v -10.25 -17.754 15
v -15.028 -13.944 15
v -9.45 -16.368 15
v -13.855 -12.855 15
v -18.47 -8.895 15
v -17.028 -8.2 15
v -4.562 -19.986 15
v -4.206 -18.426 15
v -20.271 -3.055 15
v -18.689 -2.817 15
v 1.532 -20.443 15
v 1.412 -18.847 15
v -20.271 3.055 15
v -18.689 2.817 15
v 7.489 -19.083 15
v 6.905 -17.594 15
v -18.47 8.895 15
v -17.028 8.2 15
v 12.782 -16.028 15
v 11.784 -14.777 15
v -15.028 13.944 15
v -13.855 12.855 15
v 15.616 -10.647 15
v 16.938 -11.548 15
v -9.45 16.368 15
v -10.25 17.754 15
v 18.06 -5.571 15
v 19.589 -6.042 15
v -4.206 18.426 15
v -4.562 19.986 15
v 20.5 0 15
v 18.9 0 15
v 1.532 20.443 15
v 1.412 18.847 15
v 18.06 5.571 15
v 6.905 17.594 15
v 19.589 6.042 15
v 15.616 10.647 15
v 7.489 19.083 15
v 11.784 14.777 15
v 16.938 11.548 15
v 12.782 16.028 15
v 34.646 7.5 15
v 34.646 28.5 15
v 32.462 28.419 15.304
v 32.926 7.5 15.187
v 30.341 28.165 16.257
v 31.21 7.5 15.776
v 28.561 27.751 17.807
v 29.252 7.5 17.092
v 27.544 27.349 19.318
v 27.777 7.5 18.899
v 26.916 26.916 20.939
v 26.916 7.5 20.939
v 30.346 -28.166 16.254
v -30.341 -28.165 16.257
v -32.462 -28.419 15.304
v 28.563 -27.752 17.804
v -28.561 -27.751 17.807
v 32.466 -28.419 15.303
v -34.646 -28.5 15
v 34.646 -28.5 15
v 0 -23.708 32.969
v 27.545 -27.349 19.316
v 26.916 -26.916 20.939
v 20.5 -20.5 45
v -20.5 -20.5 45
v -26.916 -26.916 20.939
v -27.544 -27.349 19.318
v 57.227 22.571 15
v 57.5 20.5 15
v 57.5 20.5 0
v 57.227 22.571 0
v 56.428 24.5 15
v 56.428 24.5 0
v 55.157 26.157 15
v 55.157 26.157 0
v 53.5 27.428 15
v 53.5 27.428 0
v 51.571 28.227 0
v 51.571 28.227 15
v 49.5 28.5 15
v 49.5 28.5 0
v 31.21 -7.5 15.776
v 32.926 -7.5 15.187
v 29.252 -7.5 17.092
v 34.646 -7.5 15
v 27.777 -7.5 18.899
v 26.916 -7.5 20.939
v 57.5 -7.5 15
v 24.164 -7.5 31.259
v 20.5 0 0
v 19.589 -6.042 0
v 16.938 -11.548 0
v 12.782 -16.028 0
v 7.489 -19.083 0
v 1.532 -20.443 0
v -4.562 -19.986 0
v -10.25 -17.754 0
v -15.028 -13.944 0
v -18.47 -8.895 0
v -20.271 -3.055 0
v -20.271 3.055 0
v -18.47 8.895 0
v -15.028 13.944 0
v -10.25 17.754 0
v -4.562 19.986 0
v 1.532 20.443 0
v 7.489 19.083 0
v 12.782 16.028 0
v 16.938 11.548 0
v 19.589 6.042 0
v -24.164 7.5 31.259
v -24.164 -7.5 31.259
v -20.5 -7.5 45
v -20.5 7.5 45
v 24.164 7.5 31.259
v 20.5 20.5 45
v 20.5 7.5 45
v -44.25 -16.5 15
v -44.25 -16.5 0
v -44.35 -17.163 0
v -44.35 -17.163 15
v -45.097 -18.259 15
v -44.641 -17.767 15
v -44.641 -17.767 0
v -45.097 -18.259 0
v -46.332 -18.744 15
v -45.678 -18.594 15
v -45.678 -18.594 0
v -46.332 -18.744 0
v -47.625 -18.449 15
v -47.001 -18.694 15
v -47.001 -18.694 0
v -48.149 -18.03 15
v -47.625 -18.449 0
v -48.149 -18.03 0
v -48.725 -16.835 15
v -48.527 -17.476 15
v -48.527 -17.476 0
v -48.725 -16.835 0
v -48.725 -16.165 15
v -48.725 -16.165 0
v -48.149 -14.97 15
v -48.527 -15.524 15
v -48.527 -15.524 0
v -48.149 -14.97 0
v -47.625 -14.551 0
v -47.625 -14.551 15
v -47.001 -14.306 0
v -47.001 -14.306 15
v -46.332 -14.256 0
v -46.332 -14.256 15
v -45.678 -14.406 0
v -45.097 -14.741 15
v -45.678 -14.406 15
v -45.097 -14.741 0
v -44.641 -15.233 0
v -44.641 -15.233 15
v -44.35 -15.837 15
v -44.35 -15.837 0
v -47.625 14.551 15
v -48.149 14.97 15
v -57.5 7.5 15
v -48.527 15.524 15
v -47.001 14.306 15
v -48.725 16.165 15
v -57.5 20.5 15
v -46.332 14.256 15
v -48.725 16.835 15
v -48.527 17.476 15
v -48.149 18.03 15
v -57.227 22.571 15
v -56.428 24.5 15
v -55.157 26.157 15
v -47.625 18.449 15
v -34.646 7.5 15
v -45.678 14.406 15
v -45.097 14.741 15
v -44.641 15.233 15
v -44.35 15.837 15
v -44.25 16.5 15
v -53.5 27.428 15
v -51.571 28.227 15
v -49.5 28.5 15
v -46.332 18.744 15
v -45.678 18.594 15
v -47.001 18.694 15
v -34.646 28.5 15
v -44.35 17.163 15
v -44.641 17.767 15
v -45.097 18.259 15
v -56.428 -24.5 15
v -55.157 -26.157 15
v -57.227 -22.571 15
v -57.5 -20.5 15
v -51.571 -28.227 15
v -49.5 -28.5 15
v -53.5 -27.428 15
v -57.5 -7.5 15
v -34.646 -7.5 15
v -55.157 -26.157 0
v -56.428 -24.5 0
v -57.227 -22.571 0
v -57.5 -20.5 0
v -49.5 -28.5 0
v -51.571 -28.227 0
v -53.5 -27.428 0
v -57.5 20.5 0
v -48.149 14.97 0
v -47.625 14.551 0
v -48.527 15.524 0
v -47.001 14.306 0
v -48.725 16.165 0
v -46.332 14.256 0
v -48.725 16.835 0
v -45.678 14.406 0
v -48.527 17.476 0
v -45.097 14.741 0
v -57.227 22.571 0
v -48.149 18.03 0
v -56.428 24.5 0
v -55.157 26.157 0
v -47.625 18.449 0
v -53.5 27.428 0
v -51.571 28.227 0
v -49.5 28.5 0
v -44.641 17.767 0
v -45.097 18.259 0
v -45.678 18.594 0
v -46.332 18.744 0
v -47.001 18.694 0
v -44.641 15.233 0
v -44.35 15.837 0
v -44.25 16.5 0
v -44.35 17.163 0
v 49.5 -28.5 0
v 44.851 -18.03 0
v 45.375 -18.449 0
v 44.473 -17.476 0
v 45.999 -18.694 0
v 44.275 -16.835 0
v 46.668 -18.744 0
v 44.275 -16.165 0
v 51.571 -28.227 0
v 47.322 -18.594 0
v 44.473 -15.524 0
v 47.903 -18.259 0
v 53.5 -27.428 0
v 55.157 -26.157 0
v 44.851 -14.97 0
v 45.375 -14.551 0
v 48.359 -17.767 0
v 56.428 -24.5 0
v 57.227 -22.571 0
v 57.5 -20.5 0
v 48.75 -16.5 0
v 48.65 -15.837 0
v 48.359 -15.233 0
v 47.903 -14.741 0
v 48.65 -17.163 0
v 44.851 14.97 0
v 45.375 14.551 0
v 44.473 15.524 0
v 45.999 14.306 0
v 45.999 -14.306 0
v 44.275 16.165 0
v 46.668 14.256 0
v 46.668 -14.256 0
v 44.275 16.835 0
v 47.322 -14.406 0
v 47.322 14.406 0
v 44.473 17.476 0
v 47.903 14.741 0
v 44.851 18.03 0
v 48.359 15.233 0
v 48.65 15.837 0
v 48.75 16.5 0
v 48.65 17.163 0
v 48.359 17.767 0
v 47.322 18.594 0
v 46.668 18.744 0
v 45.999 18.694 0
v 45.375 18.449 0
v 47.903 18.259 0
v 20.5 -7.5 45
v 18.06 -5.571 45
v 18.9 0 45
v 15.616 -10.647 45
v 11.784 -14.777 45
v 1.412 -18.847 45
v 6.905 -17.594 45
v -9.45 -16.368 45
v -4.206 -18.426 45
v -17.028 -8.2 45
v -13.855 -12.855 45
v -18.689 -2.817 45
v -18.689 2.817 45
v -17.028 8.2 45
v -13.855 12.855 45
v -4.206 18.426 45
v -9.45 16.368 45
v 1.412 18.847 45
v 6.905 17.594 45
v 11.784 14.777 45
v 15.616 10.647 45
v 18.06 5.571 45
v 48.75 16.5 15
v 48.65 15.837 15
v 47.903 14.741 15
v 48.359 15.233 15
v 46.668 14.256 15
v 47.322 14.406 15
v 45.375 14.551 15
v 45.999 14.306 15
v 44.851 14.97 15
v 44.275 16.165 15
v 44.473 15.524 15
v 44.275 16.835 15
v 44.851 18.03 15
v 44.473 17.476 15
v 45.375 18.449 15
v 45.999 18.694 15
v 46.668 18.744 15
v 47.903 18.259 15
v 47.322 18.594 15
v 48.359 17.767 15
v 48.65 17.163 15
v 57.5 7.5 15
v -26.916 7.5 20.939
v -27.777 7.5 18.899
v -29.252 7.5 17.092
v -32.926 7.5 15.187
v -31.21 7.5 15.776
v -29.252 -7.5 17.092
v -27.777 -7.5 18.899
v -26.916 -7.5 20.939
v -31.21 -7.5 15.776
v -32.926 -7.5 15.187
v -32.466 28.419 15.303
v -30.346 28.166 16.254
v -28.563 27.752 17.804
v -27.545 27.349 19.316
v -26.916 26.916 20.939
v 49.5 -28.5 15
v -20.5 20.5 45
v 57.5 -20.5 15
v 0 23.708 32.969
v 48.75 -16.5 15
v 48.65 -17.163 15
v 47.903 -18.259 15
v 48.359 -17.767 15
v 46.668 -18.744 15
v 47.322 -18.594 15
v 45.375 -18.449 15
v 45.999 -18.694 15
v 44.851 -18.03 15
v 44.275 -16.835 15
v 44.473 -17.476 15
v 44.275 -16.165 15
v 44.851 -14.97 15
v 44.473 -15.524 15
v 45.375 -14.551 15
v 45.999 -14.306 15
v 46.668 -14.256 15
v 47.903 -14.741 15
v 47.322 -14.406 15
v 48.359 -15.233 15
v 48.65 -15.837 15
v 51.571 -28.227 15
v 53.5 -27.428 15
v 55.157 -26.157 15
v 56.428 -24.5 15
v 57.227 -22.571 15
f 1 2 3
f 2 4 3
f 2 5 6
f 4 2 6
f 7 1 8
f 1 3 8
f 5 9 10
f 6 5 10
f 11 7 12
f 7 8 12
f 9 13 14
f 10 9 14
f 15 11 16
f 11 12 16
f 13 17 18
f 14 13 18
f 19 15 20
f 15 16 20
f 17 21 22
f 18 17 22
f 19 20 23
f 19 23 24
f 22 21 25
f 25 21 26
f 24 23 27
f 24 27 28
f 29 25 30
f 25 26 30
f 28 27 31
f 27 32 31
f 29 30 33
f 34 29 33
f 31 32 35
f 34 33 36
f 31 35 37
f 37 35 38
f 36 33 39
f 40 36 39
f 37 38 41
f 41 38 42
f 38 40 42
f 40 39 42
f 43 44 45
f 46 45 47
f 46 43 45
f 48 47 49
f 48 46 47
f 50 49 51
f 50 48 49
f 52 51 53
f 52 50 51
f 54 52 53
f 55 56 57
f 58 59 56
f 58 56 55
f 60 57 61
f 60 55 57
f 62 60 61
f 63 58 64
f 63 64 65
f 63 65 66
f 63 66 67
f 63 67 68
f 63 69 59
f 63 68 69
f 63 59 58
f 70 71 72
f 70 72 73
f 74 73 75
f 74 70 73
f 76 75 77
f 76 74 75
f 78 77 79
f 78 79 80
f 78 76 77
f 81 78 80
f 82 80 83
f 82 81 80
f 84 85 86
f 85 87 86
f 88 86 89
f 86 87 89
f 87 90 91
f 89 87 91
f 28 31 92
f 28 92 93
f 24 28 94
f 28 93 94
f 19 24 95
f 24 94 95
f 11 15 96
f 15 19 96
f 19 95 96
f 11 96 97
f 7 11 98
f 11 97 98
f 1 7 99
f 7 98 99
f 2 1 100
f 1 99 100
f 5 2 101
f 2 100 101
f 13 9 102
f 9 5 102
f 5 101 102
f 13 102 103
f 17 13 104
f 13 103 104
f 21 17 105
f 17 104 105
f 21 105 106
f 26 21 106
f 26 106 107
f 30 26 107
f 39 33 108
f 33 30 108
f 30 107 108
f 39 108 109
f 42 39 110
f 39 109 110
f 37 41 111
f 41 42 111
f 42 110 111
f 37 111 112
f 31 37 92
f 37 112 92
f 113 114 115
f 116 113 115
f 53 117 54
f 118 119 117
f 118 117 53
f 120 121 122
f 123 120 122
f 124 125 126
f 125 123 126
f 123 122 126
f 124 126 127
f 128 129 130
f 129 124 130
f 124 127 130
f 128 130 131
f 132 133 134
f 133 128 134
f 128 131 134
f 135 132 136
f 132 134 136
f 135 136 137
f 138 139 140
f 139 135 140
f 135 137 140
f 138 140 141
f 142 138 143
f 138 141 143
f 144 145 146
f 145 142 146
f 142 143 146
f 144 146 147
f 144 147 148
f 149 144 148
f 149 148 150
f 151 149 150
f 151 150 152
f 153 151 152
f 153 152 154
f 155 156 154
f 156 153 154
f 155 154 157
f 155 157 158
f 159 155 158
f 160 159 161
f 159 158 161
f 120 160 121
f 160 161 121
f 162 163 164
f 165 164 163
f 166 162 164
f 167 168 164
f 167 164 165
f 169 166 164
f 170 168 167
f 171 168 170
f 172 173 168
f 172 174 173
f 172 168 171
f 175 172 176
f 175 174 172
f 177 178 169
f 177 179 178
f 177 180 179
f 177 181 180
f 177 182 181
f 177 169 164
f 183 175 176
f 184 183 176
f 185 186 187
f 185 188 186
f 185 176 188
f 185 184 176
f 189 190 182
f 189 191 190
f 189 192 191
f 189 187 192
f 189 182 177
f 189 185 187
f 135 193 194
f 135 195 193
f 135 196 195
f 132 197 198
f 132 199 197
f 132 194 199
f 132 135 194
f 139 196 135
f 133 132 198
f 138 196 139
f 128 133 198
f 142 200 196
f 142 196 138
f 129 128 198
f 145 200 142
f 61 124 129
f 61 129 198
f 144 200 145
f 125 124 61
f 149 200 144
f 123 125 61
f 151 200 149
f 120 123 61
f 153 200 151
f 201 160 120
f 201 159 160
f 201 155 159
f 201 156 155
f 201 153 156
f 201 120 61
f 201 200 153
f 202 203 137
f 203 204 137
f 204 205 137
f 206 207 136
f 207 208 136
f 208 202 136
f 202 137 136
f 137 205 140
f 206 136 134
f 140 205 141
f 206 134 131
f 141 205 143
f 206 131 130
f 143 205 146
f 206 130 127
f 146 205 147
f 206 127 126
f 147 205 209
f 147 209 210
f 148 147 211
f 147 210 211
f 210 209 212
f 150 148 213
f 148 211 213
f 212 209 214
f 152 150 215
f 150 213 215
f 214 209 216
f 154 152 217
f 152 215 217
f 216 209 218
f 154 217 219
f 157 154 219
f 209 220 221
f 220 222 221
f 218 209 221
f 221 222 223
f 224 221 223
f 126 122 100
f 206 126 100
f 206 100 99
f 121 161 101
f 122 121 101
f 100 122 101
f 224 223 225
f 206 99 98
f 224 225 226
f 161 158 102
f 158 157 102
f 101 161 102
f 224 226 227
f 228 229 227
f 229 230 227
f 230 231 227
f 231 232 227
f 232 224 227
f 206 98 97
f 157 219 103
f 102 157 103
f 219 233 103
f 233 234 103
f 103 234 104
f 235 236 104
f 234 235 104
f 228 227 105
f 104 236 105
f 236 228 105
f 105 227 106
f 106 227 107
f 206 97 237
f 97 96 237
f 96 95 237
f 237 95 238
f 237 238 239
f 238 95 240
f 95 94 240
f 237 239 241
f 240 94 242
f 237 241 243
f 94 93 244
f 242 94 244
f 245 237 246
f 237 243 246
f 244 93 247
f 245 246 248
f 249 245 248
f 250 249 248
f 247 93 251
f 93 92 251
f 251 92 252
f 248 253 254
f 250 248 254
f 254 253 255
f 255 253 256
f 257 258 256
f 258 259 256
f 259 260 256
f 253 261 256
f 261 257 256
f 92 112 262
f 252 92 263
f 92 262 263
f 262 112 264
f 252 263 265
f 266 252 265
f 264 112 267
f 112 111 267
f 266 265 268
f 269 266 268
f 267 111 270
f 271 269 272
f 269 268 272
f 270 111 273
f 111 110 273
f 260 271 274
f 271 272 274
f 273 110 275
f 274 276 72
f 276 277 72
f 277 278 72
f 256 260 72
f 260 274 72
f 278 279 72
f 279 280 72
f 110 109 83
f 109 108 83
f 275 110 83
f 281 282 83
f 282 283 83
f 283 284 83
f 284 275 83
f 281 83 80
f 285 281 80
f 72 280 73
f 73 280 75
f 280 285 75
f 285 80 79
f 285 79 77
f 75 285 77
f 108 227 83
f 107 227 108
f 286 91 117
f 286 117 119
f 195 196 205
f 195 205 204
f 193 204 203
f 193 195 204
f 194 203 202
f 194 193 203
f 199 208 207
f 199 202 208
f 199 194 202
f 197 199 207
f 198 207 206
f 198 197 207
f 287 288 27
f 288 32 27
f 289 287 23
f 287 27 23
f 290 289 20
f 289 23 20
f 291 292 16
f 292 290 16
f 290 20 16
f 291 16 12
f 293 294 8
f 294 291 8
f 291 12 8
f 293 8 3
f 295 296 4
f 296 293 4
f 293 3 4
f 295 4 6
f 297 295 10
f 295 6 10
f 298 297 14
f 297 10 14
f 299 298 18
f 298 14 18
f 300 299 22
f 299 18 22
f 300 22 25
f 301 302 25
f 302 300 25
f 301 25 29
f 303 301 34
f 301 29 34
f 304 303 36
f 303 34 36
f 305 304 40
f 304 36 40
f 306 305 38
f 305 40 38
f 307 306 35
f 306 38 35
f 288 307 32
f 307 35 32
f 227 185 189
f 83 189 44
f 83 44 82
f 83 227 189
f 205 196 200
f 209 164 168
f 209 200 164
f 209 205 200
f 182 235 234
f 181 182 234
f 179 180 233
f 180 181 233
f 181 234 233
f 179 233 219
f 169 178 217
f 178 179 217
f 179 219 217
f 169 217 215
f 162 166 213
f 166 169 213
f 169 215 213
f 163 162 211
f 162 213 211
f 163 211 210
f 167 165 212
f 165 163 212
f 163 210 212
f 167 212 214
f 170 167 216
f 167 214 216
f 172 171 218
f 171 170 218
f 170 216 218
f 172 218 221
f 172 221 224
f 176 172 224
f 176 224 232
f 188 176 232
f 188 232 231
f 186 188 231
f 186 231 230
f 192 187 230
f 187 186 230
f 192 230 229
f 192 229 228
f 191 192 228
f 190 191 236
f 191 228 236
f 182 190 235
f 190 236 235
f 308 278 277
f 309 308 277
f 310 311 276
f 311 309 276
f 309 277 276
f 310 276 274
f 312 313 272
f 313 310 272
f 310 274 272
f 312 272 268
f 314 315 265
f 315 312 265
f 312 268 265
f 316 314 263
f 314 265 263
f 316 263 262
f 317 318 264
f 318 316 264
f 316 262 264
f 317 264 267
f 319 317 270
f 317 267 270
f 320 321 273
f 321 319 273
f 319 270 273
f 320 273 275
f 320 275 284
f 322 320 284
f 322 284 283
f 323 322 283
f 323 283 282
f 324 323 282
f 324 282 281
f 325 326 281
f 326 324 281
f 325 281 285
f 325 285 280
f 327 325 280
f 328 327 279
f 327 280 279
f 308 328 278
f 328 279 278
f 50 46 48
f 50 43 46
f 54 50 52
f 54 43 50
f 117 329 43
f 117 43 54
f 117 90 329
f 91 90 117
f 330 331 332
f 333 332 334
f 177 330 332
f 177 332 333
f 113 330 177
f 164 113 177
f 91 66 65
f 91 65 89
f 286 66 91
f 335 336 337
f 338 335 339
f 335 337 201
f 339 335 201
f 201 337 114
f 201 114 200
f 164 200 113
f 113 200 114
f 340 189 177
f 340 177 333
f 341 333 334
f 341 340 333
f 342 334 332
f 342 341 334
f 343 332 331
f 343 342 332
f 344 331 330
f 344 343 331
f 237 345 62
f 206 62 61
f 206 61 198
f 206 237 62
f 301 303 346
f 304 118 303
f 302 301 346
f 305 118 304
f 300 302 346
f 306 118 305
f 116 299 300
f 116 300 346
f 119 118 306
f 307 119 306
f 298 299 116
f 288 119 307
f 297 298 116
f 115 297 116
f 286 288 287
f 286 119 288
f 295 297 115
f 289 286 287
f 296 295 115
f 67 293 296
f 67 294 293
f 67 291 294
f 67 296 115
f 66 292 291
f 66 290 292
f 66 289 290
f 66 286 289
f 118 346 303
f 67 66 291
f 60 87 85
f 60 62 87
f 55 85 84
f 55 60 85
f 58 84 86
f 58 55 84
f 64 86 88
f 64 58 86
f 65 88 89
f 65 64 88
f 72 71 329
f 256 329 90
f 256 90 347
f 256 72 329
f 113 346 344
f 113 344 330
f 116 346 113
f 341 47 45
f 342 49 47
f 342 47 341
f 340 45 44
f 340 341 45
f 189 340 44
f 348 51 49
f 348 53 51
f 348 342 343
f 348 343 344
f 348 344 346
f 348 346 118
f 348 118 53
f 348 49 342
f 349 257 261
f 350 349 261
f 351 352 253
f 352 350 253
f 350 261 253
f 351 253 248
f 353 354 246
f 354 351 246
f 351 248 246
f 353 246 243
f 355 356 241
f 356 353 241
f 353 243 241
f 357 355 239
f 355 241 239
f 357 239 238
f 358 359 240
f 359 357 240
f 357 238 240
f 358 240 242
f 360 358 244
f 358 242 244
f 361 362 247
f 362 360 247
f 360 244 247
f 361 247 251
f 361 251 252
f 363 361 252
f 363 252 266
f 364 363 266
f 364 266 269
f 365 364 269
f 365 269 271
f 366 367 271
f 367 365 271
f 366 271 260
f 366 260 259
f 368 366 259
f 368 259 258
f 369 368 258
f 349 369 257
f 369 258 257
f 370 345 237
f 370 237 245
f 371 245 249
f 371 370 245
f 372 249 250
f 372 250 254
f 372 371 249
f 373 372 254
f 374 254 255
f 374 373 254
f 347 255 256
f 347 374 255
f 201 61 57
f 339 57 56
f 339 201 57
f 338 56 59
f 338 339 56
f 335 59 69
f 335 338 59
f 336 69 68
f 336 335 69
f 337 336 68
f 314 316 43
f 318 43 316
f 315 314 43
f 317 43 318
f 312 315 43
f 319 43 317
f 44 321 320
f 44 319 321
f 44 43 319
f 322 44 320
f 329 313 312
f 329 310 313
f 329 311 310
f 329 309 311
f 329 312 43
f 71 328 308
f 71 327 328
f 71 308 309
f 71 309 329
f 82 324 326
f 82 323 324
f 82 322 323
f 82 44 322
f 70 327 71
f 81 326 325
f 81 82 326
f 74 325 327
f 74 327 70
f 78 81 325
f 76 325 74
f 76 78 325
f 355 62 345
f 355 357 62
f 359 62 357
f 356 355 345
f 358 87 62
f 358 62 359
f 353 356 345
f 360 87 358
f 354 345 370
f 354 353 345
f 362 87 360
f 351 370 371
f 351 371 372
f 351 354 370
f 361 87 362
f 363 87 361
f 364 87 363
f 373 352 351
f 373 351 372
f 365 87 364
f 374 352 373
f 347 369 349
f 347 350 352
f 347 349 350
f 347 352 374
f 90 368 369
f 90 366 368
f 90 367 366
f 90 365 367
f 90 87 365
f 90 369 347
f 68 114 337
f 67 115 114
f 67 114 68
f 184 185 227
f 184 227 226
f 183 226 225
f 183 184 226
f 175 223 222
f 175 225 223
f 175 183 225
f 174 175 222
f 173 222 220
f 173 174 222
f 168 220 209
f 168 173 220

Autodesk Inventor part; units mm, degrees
ref_plane "YZ Plane" through (0, 0, 0) normal (1, 0, 0) x (0, 1, 0)
ref_plane "XZ Plane" through (0, 0, 0) normal (0, 1, 0) x (-1, 0, 0)
sketch "Sketch1" plane through (0, 0, 0) normal (0, 0, 1) x (1, 0, 0)
  line L0 (57.5, -28.5) -> (-57.5, -28.5)
  line L1 (-57.5, -28.5) -> (-57.5, 28.5)
  line L2 (-57.5, 28.5) -> (57.5, 28.5)
  line L3 (57.5, 28.5) -> (57.5, -28.5)
  line L4 (57.5, -28.5) -> (-57.5, 28.5) construction
  line L5 (-57.5, -28.5) -> (57.5, 28.5) construction
  line L6 (46.5, -16.5) -> (-46.5, -16.5) construction
  line L7 (-46.5, -16.5) -> (-46.5, 16.5) construction
  line L8 (-46.5, 16.5) -> (46.5, 16.5) construction
  line L9 (46.5, 16.5) -> (46.5, -16.5) construction
  line L10 (46.5, -16.5) -> (-46.5, 16.5) construction
  line L11 (-46.5, -16.5) -> (46.5, 16.5) construction
  line L12 (36, -11.5) -> (-36, -11.5) construction
  line L13 (-36, -11.5) -> (-36, 11.5) construction
  line L14 (-36, 11.5) -> (36, 11.5) construction
  line L15 (36, 11.5) -> (36, -11.5) construction
  line L16 (36, -11.5) -> (-36, 11.5) construction
  line L17 (-36, -11.5) -> (36, 11.5) construction
  circle A0 centre (-46.5, 16.5) radius 2.25
  circle A1 centre (-46.5, -16.5) radius 2.25
  circle A2 centre (46.5, -16.5) radius 2.25
  circle A3 centre (46.5, 16.5) radius 2.25
  point P0 (0, 0)
  dimension "d0" = 115
  dimension "d1" = 57
  dimension "d2" = 93
  dimension "d3" = 33
  dimension "d4" = 72
  dimension "d5" = 23
  dimension "d6" = 4.5
extrude "Extrusion1" add sketch "Sketch1" along normal blind 15
sketch "Sketch6" plane through (0, 0, 15) normal (0, 0, 1) x (1, 0, 0)
  line L0 (57.5, 28.5) -> (-57.5, 28.5) projected
  line L1 (28.5, -28.5) -> (-28.5, -28.5)
  line L2 (-28.5, -28.5) -> (-28.5, 28.5)
  line L3 (-28.5, 28.5) -> (28.5, 28.5)
  line L4 (28.5, 28.5) -> (28.5, -28.5)
  line L5 (28.5, -28.5) -> (-28.5, 28.5) construction
  line L6 (-28.5, -28.5) -> (28.5, 28.5) construction
  point P0 (0, 0)
  dimension "d27" = 57
ref_plane "Work Plane1" through (0, 0, 45) normal (0, 0, 1) x (1, 0, 0)
sketch "Sketch7" plane through (0, 0, 45) normal (0, 0, 1) x (1, 0, 0)
  line L0 (20.5, -20.5) -> (-20.5, -20.5)
  line L1 (-20.5, -20.5) -> (-20.5, 20.5)
  line L2 (-20.5, 20.5) -> (20.5, 20.5)
  line L3 (20.5, 20.5) -> (20.5, -20.5)
  line L4 (20.5, -20.5) -> (-20.5, 20.5) construction
  line L5 (-20.5, -20.5) -> (20.5, 20.5) construction
  point P0 (0, 0)
  dimension "d29" = 41
  dimension "d30" = 41
loft "Loft1" add profiles "Sketch6", "Sketch7"
fillet "Fillet2" radius 8 2 edges at (28.5, 0, 15) (-28.5, 0, 15)
sketch "Sketch8" plane through (0, 0, 0) normal (0, 1, 0) x (-1, 0, 0)
  line L0 (-34.6462, 15) -> (34.6462, 15) projected
  arc A0 (26.9163, 20.9387) -> (34.6462, 15) centre (34.6462, 23) ccw projected
  line L1 (26.9163, 20.9387) -> (20.5, 45) projected
  line L2 (20.5, 45) -> (-20.5, 45) projected
  line L3 (-26.9163, 20.9387) -> (-20.5, 45) projected
  arc A1 (-34.6462, 15) -> (-26.9163, 20.9387) centre (-34.6462, 23) ccw projected
  line L4 (57.5, 0) -> (-57.5, 0) projected
  line L5 (57.5, 0) -> (57.5, 15) projected
  line L6 (34.6462, 15) -> (57.5, 15) projected
  line L7 (-34.6462, 15) -> (34.6462, 15) projected
  line L8 (-57.5, 15) -> (-34.6462, 15) projected
  line L9 (-57.5, 0) -> (-57.5, 15) projected
  line L10 (57.5, 15) -> (24.1643, 31.2589)
  line L11 (26.9163, 20.9387) -> (20.5, 45) projected
  line L12 (24.1643, 31.2589) -> (24.1643, 15)
  line L13 (57.5, 0) -> (57.5, 15) projected
  line L14 (24.1643, 15) -> (57.5, 15)
  line L15 (-57.5, 15) -> (-24.1643, 31.2589)
  line L16 (-24.1643, 31.2589) -> (-24.1643, 15)
  line L17 (-34.6462, 15) -> (34.6462, 15) projected
  line L18 (-57.5, 15) -> (-34.6462, 15) projected
  line L19 (-24.1643, 15) -> (-57.5, 15)
  point P0 (0, 0)
  dimension "d36" = 26
  dimension "d37" = 26
extrude "Extrusion5" add sketch "Sketch8" along normal mid plane 15 contours A1 L3 L16 L0 | L8 L15 L3 A1 | L16 L3 L2 L1 L12 L0 | A0 L1 L10 L6
fillet "Fillet3" radius 8 4 edges at (-57.5, 28.5, 7.5) (-57.5, -28.5, 7.5) (57.5, -28.5, 7.5) (57.5, 28.5, 7.5)
sketch "Sketch9" plane through (0, 0, 0) normal (0, 1, 0) x (-1, 0, 0)
  line L0 (0, -9) -> (0, 54) projected
  line L1 (0, 0) -> (0, 45)
  line L2 (20.5, 45) -> (-20.5, 45) projected
  line L3 (0, 45) -> (-18.9, 45)
  line L4 (-18.9, 45) -> (-18.9, 15)
  line L5 (-18.9, 15) -> (-20.5, 15)
  line L6 (-20.5, 15) -> (-20.5, 0)
  line L7 (-20.5, 0) -> (0, 0)
  dimension "d41" = 37.8
  dimension "d42" = 41
  dimension "d43" = 15
revolve "Revolution2" cut sketch "Sketch9" angle 360 about axis through (0, 0, -10) along (0, 0, 1)
equation "\"d37\" = d36"
properties part number "sujetador guia ejercedor presion"
